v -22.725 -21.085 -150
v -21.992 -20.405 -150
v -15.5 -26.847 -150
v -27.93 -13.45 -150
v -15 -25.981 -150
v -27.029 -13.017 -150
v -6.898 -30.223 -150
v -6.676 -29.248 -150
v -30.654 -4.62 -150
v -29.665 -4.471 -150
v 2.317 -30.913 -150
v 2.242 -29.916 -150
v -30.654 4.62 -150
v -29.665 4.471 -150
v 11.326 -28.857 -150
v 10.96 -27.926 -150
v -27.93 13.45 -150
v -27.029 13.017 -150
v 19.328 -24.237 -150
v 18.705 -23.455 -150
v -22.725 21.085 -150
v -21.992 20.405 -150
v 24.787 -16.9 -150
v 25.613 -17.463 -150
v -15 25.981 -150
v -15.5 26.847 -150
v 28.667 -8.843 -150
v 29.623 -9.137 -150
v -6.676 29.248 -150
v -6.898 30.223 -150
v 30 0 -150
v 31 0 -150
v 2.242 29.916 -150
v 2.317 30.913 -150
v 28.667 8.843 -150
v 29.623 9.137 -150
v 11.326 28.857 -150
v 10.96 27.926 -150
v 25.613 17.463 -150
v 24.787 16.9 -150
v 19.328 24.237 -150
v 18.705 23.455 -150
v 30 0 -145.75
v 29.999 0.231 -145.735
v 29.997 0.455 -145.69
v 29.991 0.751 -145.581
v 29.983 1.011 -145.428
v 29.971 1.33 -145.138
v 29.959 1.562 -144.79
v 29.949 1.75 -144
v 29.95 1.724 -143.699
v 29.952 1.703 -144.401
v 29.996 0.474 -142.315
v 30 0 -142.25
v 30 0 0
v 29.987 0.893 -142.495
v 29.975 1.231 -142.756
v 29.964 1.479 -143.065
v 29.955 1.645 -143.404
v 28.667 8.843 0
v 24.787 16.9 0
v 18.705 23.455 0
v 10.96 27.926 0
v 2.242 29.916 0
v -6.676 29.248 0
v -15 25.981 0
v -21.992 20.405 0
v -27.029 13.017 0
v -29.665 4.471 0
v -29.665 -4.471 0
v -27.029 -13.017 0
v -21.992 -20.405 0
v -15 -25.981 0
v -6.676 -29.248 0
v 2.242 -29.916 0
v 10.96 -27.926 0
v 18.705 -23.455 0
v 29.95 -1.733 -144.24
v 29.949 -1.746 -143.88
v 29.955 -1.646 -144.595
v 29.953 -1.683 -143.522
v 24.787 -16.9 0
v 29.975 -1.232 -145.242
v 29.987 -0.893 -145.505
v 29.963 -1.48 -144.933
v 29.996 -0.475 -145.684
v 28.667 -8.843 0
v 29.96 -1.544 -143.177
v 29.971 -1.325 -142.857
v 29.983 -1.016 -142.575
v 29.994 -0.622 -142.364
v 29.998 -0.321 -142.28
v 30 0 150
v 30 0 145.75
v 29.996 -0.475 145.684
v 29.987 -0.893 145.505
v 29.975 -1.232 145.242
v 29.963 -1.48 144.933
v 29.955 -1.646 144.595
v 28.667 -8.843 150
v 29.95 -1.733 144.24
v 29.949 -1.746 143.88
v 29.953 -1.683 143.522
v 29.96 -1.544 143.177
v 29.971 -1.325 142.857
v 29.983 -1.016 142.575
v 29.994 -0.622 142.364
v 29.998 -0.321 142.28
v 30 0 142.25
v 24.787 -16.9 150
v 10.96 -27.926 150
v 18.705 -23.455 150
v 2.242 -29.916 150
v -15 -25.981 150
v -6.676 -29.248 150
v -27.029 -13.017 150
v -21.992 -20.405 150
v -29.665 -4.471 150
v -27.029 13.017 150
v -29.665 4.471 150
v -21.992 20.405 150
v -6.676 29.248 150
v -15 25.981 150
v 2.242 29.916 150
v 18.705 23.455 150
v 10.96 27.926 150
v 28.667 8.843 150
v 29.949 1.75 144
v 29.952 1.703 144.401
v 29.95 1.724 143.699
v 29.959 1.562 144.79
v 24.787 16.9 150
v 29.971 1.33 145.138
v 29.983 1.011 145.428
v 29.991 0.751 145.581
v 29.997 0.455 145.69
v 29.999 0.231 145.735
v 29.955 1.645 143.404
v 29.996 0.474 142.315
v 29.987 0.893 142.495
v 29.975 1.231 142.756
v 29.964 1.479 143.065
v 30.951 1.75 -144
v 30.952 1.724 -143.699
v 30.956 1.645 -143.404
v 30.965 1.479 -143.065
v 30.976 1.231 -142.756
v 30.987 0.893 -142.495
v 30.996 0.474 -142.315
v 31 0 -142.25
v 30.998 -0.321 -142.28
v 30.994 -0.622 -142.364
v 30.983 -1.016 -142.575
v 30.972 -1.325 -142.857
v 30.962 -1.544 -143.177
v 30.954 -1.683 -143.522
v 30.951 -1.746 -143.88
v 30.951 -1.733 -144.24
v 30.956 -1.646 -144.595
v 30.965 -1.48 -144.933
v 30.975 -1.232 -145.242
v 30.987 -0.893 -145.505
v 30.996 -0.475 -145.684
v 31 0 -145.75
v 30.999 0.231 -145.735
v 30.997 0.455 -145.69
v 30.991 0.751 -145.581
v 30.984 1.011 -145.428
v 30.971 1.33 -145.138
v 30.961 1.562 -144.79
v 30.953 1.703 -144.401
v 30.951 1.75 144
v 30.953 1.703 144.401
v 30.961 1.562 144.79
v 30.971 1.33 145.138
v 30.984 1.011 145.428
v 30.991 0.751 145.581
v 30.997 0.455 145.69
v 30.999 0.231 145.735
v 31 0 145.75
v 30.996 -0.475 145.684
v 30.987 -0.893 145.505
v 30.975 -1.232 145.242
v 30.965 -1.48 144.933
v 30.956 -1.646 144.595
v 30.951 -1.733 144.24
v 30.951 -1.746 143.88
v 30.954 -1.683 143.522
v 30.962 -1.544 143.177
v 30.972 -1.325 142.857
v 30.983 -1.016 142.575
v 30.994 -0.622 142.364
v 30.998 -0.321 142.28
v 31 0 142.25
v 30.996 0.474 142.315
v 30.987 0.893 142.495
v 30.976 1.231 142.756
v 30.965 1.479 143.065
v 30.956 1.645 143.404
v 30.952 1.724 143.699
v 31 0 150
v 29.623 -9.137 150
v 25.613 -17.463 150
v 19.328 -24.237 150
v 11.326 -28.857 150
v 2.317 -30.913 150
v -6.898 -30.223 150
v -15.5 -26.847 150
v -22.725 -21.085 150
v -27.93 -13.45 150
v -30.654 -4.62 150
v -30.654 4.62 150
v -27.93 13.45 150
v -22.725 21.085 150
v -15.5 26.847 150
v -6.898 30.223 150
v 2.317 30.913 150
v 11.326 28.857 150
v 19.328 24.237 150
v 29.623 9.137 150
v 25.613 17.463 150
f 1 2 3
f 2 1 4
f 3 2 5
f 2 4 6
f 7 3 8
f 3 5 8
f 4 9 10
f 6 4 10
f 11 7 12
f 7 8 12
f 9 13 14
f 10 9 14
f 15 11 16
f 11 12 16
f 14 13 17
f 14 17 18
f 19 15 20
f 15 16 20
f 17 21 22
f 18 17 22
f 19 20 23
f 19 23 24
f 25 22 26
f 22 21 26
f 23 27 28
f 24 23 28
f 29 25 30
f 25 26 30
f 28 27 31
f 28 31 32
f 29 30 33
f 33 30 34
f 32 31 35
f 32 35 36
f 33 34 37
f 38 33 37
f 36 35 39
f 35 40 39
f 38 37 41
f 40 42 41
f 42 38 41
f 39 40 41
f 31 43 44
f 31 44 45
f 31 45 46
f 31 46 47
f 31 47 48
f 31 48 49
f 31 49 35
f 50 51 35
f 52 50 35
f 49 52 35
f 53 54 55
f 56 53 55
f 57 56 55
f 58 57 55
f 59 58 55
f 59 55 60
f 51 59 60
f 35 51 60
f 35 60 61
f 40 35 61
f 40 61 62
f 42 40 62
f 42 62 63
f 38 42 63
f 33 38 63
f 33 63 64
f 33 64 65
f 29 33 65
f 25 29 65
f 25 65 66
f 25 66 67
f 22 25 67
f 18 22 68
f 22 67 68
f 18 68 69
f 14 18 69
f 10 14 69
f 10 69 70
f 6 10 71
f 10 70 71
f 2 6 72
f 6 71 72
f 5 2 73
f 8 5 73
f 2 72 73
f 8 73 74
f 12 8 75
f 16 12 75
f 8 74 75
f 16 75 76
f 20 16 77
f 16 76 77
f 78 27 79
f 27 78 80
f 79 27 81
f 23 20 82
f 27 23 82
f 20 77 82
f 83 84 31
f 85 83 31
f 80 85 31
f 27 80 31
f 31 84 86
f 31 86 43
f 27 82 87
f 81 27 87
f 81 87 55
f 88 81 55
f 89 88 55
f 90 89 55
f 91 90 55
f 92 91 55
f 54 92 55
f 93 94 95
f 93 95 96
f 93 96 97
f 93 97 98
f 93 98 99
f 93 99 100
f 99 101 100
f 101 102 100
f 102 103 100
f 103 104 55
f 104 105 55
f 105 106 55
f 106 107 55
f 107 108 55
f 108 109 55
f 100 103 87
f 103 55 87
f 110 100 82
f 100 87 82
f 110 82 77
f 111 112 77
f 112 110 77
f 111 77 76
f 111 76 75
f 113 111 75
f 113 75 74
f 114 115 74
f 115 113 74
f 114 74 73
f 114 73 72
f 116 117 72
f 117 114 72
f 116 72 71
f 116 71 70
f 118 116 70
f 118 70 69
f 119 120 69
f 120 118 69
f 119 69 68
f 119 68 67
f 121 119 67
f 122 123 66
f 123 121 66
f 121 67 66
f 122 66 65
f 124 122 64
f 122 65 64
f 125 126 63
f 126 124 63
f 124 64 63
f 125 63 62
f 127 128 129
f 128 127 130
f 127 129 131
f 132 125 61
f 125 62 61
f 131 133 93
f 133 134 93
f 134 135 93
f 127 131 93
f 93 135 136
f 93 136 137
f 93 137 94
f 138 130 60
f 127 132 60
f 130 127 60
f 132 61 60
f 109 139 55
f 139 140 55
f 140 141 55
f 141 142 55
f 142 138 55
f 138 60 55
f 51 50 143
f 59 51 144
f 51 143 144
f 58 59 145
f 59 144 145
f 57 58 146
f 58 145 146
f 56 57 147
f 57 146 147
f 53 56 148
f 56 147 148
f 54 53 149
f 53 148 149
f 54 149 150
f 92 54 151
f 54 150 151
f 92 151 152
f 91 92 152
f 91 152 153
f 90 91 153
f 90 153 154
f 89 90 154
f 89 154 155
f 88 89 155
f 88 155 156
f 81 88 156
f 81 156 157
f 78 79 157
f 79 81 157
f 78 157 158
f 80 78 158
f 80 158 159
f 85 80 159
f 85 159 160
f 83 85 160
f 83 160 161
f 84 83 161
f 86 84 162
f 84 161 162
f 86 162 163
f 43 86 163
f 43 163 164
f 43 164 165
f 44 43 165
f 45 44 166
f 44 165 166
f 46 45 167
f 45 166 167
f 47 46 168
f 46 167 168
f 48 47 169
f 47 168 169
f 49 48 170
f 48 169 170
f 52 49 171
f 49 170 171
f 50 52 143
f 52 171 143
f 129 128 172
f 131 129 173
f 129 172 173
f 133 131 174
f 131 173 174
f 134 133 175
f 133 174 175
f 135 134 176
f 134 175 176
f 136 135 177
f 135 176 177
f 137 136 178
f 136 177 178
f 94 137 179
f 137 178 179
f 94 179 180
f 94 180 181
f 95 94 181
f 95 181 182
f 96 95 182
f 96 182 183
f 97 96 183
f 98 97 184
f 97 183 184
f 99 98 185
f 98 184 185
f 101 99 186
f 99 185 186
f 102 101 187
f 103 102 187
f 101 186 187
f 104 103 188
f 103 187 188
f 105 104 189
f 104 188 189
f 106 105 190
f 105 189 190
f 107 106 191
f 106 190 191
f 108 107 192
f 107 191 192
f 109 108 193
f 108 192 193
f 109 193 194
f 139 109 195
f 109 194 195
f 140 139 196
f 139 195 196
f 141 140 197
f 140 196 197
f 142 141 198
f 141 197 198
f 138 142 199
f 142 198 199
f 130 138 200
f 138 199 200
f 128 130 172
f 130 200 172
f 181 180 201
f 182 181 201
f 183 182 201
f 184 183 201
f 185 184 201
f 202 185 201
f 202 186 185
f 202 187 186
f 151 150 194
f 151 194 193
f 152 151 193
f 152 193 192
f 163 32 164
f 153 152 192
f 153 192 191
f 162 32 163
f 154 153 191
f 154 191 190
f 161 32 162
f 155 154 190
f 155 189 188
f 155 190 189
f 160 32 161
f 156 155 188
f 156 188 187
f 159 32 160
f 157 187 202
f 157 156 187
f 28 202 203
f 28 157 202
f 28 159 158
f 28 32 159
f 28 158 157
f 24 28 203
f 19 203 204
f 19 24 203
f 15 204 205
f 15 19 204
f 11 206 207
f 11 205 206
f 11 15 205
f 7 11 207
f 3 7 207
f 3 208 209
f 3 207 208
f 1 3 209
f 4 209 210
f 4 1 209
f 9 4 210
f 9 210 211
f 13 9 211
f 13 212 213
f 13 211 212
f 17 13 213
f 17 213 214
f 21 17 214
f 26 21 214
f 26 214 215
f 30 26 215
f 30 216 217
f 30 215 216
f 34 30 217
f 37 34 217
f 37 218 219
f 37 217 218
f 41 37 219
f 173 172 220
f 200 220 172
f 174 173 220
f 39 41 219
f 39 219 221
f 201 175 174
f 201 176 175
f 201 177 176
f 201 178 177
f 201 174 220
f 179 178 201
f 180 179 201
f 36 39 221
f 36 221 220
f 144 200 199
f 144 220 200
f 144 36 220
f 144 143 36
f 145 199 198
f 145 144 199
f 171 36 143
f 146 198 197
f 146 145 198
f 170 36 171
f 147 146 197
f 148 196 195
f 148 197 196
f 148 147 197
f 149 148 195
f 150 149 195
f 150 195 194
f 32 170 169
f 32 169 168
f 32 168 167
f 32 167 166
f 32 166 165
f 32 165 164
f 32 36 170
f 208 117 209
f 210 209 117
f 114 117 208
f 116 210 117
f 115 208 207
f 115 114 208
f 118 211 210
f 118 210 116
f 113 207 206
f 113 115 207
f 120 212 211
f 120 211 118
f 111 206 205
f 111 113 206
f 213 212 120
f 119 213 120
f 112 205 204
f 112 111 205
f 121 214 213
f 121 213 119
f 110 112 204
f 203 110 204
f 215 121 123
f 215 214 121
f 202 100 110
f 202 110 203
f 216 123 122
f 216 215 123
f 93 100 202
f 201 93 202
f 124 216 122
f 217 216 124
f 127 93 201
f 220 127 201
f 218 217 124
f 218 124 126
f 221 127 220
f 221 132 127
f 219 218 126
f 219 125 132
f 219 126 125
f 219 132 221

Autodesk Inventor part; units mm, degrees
ref_plane "XZ Plane" through (0, 0, 0) normal (0, 1, 0) x (-1, 0, 0)
ref_plane "XY Plane" through (0, 0, 0) normal (0, 0, 1) x (1, 0, 0)
sketch "Skizze1" plane through (0, 0, 0) normal (0, 0, 1) x (1, 0, 0)
  circle A0 centre (0, 0) radius 31
  circle A1 centre (0, 0) radius 30
  dimension "d0" = 62
  dimension "d1" = 60
extrude "Extrusion1" add sketch "Skizze1" along normal mid plane 300
ref_plane "Arbeitsebene1" through (30.5, 0, 0) normal (1, 0, 0) x (0, 1, 0)
sketch "Skizze2" plane through (30.5, 0, 0) normal (1, 0, 0) x (0, 1, 0)
  circle A0 centre (0, 144) radius 1.75
  line L0 (31, 150) -> (-31, 150) projected
  point P0 (0, 0)
  dimension "d5" = 3.5
  dimension "d6" = 6
extrude "Extrusion2" cut sketch "Skizze2" against normal mid plane 10
mirror "Spiegeln1" about plane through (0, 0, 0) normal (0, 0, 1) of "Extrusion2"
properties part number "Segment_elektro"
